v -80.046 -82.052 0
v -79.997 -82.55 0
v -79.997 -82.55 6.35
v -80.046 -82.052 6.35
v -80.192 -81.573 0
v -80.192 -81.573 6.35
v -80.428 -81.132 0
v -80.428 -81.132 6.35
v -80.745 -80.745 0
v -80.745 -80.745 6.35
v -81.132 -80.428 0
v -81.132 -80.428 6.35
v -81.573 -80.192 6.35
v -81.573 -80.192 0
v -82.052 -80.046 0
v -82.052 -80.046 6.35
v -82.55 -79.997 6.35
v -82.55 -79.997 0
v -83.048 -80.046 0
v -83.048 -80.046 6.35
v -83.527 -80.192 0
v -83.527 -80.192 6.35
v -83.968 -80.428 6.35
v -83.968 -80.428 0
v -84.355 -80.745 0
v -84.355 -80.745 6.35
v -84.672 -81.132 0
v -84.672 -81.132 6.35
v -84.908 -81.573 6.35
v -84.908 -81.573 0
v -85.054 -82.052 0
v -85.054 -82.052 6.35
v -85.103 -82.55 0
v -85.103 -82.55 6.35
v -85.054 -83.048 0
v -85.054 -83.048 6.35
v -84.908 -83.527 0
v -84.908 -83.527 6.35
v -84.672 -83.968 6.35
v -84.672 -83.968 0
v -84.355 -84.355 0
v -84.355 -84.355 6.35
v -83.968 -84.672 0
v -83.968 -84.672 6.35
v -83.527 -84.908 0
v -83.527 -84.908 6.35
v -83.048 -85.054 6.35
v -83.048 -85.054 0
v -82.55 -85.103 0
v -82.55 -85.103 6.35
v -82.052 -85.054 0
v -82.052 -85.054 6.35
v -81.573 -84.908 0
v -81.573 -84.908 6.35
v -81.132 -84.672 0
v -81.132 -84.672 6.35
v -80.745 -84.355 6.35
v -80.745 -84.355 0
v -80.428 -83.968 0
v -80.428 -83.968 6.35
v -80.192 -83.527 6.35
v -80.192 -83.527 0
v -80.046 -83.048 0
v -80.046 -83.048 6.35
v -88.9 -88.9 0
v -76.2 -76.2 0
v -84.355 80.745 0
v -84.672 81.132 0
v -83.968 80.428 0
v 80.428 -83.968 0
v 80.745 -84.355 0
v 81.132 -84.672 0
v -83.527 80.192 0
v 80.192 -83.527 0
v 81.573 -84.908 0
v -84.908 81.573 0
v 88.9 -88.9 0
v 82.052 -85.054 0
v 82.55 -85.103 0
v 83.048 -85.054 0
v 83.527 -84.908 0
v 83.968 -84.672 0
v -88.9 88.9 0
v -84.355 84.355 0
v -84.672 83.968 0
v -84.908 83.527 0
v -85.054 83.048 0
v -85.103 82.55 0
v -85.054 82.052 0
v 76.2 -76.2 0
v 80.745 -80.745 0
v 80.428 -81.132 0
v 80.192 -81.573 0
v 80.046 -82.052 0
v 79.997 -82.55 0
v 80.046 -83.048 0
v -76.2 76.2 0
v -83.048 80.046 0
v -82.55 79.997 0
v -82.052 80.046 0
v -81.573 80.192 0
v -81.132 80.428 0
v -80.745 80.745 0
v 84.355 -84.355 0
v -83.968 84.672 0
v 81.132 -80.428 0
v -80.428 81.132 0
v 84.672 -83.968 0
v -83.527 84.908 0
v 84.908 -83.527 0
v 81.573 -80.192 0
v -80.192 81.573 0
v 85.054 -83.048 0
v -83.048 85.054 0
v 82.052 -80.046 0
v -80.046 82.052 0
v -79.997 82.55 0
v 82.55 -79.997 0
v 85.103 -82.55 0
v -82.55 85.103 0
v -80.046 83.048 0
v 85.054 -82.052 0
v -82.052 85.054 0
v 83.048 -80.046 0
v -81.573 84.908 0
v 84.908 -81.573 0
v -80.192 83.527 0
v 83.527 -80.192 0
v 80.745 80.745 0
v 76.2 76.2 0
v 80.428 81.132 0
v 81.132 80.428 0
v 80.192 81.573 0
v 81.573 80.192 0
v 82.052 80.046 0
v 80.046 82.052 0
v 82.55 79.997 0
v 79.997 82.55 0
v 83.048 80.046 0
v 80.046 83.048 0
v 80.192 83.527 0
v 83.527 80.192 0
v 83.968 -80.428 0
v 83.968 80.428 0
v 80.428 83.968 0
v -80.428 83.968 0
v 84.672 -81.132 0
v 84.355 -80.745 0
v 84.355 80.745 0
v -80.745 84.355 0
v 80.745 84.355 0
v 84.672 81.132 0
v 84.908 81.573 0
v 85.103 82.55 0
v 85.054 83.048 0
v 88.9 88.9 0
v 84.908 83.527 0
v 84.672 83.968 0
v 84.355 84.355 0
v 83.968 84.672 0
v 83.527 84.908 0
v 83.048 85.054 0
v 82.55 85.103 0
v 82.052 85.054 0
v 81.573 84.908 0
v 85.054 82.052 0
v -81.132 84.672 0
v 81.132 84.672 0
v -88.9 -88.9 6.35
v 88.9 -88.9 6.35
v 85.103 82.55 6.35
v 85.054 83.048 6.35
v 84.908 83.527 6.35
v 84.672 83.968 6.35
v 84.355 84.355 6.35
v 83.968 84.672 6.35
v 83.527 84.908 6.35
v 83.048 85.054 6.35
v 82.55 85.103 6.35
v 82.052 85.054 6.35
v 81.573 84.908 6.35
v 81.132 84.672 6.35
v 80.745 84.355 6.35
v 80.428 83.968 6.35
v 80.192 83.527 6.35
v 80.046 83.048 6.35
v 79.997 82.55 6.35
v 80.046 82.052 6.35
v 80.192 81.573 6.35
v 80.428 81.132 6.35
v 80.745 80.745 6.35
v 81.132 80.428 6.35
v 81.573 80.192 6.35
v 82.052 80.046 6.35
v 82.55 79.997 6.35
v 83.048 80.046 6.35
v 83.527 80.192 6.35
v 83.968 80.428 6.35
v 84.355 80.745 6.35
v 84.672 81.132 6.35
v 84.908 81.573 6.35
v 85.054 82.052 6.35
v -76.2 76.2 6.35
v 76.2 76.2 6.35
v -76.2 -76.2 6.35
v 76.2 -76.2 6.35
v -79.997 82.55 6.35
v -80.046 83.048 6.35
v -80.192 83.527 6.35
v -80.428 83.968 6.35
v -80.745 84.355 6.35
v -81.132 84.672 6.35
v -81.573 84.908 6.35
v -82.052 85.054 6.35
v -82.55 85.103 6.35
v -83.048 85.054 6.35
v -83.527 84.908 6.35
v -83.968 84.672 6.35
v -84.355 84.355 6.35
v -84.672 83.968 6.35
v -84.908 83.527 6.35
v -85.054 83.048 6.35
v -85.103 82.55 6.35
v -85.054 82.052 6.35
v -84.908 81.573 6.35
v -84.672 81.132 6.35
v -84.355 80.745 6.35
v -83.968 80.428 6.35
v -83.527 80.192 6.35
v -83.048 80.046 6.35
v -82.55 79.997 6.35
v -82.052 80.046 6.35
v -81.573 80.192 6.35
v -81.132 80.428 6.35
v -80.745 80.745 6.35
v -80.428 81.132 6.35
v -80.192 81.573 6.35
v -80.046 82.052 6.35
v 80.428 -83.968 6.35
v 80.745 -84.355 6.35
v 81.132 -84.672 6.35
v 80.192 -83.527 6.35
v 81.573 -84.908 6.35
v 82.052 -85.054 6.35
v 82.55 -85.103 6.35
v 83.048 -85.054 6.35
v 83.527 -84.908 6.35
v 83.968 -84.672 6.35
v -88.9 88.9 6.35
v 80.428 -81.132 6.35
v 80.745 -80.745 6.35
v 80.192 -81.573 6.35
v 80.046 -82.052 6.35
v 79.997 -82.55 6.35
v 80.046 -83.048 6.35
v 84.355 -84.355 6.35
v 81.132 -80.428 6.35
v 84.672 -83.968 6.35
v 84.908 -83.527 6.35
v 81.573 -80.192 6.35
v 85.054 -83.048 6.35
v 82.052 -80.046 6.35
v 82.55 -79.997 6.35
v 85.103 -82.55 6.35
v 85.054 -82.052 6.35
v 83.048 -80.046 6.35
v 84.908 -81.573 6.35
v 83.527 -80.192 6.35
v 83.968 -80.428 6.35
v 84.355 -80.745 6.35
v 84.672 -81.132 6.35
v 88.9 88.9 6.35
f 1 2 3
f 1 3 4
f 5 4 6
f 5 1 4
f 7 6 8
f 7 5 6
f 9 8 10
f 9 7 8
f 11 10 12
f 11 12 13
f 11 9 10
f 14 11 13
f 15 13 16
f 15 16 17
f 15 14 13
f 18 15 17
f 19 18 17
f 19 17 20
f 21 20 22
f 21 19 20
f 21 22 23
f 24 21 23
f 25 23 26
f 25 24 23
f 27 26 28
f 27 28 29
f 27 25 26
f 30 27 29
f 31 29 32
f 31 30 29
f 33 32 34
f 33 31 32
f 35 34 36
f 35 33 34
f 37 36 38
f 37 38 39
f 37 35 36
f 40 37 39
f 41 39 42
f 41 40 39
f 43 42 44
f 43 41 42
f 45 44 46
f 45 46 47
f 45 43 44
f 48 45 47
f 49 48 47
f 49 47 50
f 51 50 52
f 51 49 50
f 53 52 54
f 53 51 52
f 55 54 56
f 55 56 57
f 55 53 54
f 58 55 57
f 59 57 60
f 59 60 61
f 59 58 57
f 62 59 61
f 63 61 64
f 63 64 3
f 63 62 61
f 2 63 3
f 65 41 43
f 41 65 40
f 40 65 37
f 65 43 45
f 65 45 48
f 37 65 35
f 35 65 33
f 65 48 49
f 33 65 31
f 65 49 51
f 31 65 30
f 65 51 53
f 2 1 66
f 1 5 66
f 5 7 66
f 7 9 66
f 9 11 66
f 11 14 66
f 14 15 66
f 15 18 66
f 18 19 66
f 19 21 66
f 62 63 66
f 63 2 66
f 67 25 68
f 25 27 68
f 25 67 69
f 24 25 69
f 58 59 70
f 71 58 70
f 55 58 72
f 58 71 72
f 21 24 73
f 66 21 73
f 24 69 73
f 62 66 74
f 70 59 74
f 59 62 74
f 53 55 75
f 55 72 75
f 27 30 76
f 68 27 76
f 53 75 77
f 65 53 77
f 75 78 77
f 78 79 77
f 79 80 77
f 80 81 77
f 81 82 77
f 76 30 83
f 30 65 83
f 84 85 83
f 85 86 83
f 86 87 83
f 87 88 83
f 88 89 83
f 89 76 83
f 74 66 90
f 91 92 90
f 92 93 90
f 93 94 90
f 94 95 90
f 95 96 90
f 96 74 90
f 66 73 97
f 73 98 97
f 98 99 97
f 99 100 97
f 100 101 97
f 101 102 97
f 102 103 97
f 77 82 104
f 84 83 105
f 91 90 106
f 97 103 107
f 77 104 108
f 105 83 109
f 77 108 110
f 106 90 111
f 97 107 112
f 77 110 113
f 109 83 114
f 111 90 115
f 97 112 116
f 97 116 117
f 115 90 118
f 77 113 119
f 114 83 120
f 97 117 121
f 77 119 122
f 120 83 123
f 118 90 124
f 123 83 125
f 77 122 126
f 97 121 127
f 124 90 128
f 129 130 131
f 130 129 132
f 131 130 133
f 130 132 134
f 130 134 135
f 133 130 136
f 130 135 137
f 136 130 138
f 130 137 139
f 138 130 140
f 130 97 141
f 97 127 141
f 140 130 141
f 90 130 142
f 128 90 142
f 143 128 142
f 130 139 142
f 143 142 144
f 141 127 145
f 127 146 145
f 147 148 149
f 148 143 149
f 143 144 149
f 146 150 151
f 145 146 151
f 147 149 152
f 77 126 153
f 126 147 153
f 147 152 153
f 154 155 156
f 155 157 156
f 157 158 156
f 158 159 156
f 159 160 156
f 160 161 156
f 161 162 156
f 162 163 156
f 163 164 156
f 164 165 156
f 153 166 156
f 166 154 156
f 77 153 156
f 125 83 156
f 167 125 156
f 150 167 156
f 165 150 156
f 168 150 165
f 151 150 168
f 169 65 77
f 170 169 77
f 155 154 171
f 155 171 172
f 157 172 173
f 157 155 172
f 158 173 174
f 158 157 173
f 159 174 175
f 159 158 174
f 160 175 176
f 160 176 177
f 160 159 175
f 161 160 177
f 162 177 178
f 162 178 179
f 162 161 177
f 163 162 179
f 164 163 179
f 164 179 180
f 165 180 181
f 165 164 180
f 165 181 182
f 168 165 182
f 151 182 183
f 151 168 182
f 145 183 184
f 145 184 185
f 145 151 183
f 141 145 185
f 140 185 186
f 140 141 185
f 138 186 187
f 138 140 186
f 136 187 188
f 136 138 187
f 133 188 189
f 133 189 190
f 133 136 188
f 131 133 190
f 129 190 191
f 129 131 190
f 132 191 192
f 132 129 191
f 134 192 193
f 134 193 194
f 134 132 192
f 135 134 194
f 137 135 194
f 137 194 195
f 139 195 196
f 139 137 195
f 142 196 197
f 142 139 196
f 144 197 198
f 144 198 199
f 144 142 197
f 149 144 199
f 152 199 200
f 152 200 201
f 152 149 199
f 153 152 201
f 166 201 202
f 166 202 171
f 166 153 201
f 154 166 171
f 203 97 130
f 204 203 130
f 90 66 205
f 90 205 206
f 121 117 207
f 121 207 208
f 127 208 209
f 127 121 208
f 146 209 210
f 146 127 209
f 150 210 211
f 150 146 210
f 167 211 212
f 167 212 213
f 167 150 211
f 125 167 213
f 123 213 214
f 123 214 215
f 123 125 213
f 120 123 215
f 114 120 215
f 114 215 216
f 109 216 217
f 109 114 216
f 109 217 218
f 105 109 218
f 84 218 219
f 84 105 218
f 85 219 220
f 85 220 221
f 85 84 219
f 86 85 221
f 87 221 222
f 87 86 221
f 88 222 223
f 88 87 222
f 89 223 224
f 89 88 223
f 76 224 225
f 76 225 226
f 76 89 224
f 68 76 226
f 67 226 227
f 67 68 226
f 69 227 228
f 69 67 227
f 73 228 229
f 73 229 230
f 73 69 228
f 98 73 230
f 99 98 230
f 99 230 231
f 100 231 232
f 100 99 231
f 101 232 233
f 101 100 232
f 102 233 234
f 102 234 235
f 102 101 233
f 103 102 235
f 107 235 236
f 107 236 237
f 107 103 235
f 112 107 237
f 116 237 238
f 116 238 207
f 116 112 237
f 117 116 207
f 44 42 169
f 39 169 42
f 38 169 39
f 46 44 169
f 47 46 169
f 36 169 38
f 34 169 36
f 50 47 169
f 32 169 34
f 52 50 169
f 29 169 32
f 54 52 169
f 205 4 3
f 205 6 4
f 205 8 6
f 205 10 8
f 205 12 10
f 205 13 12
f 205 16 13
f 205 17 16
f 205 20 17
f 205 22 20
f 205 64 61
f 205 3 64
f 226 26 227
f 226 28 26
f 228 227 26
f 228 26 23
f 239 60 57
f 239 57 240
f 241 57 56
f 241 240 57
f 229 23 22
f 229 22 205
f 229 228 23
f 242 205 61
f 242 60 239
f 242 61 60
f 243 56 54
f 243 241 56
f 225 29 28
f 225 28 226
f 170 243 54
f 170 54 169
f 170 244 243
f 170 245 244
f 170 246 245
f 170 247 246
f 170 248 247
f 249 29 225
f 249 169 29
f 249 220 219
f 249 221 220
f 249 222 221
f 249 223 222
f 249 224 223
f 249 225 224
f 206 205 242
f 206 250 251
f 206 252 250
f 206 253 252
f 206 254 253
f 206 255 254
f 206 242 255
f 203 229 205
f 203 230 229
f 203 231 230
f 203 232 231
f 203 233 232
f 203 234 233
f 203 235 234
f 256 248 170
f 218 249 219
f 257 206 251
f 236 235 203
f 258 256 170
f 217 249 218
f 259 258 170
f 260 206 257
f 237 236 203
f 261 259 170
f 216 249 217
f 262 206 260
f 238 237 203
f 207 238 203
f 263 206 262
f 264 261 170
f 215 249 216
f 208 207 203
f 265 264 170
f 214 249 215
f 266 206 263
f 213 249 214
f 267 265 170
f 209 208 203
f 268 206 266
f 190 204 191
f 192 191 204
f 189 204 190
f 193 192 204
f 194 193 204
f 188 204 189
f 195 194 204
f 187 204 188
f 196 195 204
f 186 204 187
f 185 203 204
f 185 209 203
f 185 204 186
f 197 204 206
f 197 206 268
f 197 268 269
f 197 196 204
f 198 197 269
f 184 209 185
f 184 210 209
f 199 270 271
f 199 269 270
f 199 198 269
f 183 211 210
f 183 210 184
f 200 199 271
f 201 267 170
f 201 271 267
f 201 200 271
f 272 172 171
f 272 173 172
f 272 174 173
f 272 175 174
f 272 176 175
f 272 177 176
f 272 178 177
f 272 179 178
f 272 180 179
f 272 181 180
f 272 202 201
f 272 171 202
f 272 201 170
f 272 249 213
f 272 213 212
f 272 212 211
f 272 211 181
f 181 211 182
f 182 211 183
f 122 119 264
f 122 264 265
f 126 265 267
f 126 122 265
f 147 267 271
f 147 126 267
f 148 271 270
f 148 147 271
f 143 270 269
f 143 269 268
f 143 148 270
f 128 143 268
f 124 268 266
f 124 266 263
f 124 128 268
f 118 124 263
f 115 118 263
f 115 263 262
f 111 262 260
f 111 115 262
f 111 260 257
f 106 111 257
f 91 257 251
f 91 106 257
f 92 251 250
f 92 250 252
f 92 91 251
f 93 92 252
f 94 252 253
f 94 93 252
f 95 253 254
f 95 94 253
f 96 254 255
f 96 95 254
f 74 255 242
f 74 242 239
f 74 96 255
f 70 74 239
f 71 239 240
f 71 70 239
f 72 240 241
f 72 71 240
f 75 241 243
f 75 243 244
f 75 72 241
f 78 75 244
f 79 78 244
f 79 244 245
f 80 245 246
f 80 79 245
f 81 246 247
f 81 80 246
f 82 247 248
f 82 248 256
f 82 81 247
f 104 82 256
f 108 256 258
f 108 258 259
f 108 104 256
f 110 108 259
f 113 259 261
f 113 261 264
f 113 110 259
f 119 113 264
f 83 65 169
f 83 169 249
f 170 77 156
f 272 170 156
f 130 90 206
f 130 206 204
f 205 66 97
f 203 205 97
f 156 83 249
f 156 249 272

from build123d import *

# Parameters (mm, degrees)
F0_W     = 177.8
F0_H     = 177.8
F0_R     = 2.5527
F0_W_2   = 152.4
F0_H_2   = 152.4
F1_DEPTH = 6.35


with BuildPart() as f1:
    # F0 (on Top) → F1 (new body)
    with BuildSketch(Plane.XY):
        Rectangle(F0_W, F0_H)
        with Locations((-82.55, -82.55)):
            Circle(F0_R, mode=Mode.SUBTRACT)
        with Locations((82.55, -82.55)):
            Circle(F0_R, mode=Mode.SUBTRACT)
        with Locations((-82.55, 82.55)):
            Circle(F0_R, mode=Mode.SUBTRACT)
        Rectangle(F0_W_2, F0_H_2, mode=Mode.SUBTRACT)
        with Locations((82.55, 82.55)):
            Circle(F0_R, mode=Mode.SUBTRACT)
    extrude(amount=F1_DEPTH)


solid = f1.part
